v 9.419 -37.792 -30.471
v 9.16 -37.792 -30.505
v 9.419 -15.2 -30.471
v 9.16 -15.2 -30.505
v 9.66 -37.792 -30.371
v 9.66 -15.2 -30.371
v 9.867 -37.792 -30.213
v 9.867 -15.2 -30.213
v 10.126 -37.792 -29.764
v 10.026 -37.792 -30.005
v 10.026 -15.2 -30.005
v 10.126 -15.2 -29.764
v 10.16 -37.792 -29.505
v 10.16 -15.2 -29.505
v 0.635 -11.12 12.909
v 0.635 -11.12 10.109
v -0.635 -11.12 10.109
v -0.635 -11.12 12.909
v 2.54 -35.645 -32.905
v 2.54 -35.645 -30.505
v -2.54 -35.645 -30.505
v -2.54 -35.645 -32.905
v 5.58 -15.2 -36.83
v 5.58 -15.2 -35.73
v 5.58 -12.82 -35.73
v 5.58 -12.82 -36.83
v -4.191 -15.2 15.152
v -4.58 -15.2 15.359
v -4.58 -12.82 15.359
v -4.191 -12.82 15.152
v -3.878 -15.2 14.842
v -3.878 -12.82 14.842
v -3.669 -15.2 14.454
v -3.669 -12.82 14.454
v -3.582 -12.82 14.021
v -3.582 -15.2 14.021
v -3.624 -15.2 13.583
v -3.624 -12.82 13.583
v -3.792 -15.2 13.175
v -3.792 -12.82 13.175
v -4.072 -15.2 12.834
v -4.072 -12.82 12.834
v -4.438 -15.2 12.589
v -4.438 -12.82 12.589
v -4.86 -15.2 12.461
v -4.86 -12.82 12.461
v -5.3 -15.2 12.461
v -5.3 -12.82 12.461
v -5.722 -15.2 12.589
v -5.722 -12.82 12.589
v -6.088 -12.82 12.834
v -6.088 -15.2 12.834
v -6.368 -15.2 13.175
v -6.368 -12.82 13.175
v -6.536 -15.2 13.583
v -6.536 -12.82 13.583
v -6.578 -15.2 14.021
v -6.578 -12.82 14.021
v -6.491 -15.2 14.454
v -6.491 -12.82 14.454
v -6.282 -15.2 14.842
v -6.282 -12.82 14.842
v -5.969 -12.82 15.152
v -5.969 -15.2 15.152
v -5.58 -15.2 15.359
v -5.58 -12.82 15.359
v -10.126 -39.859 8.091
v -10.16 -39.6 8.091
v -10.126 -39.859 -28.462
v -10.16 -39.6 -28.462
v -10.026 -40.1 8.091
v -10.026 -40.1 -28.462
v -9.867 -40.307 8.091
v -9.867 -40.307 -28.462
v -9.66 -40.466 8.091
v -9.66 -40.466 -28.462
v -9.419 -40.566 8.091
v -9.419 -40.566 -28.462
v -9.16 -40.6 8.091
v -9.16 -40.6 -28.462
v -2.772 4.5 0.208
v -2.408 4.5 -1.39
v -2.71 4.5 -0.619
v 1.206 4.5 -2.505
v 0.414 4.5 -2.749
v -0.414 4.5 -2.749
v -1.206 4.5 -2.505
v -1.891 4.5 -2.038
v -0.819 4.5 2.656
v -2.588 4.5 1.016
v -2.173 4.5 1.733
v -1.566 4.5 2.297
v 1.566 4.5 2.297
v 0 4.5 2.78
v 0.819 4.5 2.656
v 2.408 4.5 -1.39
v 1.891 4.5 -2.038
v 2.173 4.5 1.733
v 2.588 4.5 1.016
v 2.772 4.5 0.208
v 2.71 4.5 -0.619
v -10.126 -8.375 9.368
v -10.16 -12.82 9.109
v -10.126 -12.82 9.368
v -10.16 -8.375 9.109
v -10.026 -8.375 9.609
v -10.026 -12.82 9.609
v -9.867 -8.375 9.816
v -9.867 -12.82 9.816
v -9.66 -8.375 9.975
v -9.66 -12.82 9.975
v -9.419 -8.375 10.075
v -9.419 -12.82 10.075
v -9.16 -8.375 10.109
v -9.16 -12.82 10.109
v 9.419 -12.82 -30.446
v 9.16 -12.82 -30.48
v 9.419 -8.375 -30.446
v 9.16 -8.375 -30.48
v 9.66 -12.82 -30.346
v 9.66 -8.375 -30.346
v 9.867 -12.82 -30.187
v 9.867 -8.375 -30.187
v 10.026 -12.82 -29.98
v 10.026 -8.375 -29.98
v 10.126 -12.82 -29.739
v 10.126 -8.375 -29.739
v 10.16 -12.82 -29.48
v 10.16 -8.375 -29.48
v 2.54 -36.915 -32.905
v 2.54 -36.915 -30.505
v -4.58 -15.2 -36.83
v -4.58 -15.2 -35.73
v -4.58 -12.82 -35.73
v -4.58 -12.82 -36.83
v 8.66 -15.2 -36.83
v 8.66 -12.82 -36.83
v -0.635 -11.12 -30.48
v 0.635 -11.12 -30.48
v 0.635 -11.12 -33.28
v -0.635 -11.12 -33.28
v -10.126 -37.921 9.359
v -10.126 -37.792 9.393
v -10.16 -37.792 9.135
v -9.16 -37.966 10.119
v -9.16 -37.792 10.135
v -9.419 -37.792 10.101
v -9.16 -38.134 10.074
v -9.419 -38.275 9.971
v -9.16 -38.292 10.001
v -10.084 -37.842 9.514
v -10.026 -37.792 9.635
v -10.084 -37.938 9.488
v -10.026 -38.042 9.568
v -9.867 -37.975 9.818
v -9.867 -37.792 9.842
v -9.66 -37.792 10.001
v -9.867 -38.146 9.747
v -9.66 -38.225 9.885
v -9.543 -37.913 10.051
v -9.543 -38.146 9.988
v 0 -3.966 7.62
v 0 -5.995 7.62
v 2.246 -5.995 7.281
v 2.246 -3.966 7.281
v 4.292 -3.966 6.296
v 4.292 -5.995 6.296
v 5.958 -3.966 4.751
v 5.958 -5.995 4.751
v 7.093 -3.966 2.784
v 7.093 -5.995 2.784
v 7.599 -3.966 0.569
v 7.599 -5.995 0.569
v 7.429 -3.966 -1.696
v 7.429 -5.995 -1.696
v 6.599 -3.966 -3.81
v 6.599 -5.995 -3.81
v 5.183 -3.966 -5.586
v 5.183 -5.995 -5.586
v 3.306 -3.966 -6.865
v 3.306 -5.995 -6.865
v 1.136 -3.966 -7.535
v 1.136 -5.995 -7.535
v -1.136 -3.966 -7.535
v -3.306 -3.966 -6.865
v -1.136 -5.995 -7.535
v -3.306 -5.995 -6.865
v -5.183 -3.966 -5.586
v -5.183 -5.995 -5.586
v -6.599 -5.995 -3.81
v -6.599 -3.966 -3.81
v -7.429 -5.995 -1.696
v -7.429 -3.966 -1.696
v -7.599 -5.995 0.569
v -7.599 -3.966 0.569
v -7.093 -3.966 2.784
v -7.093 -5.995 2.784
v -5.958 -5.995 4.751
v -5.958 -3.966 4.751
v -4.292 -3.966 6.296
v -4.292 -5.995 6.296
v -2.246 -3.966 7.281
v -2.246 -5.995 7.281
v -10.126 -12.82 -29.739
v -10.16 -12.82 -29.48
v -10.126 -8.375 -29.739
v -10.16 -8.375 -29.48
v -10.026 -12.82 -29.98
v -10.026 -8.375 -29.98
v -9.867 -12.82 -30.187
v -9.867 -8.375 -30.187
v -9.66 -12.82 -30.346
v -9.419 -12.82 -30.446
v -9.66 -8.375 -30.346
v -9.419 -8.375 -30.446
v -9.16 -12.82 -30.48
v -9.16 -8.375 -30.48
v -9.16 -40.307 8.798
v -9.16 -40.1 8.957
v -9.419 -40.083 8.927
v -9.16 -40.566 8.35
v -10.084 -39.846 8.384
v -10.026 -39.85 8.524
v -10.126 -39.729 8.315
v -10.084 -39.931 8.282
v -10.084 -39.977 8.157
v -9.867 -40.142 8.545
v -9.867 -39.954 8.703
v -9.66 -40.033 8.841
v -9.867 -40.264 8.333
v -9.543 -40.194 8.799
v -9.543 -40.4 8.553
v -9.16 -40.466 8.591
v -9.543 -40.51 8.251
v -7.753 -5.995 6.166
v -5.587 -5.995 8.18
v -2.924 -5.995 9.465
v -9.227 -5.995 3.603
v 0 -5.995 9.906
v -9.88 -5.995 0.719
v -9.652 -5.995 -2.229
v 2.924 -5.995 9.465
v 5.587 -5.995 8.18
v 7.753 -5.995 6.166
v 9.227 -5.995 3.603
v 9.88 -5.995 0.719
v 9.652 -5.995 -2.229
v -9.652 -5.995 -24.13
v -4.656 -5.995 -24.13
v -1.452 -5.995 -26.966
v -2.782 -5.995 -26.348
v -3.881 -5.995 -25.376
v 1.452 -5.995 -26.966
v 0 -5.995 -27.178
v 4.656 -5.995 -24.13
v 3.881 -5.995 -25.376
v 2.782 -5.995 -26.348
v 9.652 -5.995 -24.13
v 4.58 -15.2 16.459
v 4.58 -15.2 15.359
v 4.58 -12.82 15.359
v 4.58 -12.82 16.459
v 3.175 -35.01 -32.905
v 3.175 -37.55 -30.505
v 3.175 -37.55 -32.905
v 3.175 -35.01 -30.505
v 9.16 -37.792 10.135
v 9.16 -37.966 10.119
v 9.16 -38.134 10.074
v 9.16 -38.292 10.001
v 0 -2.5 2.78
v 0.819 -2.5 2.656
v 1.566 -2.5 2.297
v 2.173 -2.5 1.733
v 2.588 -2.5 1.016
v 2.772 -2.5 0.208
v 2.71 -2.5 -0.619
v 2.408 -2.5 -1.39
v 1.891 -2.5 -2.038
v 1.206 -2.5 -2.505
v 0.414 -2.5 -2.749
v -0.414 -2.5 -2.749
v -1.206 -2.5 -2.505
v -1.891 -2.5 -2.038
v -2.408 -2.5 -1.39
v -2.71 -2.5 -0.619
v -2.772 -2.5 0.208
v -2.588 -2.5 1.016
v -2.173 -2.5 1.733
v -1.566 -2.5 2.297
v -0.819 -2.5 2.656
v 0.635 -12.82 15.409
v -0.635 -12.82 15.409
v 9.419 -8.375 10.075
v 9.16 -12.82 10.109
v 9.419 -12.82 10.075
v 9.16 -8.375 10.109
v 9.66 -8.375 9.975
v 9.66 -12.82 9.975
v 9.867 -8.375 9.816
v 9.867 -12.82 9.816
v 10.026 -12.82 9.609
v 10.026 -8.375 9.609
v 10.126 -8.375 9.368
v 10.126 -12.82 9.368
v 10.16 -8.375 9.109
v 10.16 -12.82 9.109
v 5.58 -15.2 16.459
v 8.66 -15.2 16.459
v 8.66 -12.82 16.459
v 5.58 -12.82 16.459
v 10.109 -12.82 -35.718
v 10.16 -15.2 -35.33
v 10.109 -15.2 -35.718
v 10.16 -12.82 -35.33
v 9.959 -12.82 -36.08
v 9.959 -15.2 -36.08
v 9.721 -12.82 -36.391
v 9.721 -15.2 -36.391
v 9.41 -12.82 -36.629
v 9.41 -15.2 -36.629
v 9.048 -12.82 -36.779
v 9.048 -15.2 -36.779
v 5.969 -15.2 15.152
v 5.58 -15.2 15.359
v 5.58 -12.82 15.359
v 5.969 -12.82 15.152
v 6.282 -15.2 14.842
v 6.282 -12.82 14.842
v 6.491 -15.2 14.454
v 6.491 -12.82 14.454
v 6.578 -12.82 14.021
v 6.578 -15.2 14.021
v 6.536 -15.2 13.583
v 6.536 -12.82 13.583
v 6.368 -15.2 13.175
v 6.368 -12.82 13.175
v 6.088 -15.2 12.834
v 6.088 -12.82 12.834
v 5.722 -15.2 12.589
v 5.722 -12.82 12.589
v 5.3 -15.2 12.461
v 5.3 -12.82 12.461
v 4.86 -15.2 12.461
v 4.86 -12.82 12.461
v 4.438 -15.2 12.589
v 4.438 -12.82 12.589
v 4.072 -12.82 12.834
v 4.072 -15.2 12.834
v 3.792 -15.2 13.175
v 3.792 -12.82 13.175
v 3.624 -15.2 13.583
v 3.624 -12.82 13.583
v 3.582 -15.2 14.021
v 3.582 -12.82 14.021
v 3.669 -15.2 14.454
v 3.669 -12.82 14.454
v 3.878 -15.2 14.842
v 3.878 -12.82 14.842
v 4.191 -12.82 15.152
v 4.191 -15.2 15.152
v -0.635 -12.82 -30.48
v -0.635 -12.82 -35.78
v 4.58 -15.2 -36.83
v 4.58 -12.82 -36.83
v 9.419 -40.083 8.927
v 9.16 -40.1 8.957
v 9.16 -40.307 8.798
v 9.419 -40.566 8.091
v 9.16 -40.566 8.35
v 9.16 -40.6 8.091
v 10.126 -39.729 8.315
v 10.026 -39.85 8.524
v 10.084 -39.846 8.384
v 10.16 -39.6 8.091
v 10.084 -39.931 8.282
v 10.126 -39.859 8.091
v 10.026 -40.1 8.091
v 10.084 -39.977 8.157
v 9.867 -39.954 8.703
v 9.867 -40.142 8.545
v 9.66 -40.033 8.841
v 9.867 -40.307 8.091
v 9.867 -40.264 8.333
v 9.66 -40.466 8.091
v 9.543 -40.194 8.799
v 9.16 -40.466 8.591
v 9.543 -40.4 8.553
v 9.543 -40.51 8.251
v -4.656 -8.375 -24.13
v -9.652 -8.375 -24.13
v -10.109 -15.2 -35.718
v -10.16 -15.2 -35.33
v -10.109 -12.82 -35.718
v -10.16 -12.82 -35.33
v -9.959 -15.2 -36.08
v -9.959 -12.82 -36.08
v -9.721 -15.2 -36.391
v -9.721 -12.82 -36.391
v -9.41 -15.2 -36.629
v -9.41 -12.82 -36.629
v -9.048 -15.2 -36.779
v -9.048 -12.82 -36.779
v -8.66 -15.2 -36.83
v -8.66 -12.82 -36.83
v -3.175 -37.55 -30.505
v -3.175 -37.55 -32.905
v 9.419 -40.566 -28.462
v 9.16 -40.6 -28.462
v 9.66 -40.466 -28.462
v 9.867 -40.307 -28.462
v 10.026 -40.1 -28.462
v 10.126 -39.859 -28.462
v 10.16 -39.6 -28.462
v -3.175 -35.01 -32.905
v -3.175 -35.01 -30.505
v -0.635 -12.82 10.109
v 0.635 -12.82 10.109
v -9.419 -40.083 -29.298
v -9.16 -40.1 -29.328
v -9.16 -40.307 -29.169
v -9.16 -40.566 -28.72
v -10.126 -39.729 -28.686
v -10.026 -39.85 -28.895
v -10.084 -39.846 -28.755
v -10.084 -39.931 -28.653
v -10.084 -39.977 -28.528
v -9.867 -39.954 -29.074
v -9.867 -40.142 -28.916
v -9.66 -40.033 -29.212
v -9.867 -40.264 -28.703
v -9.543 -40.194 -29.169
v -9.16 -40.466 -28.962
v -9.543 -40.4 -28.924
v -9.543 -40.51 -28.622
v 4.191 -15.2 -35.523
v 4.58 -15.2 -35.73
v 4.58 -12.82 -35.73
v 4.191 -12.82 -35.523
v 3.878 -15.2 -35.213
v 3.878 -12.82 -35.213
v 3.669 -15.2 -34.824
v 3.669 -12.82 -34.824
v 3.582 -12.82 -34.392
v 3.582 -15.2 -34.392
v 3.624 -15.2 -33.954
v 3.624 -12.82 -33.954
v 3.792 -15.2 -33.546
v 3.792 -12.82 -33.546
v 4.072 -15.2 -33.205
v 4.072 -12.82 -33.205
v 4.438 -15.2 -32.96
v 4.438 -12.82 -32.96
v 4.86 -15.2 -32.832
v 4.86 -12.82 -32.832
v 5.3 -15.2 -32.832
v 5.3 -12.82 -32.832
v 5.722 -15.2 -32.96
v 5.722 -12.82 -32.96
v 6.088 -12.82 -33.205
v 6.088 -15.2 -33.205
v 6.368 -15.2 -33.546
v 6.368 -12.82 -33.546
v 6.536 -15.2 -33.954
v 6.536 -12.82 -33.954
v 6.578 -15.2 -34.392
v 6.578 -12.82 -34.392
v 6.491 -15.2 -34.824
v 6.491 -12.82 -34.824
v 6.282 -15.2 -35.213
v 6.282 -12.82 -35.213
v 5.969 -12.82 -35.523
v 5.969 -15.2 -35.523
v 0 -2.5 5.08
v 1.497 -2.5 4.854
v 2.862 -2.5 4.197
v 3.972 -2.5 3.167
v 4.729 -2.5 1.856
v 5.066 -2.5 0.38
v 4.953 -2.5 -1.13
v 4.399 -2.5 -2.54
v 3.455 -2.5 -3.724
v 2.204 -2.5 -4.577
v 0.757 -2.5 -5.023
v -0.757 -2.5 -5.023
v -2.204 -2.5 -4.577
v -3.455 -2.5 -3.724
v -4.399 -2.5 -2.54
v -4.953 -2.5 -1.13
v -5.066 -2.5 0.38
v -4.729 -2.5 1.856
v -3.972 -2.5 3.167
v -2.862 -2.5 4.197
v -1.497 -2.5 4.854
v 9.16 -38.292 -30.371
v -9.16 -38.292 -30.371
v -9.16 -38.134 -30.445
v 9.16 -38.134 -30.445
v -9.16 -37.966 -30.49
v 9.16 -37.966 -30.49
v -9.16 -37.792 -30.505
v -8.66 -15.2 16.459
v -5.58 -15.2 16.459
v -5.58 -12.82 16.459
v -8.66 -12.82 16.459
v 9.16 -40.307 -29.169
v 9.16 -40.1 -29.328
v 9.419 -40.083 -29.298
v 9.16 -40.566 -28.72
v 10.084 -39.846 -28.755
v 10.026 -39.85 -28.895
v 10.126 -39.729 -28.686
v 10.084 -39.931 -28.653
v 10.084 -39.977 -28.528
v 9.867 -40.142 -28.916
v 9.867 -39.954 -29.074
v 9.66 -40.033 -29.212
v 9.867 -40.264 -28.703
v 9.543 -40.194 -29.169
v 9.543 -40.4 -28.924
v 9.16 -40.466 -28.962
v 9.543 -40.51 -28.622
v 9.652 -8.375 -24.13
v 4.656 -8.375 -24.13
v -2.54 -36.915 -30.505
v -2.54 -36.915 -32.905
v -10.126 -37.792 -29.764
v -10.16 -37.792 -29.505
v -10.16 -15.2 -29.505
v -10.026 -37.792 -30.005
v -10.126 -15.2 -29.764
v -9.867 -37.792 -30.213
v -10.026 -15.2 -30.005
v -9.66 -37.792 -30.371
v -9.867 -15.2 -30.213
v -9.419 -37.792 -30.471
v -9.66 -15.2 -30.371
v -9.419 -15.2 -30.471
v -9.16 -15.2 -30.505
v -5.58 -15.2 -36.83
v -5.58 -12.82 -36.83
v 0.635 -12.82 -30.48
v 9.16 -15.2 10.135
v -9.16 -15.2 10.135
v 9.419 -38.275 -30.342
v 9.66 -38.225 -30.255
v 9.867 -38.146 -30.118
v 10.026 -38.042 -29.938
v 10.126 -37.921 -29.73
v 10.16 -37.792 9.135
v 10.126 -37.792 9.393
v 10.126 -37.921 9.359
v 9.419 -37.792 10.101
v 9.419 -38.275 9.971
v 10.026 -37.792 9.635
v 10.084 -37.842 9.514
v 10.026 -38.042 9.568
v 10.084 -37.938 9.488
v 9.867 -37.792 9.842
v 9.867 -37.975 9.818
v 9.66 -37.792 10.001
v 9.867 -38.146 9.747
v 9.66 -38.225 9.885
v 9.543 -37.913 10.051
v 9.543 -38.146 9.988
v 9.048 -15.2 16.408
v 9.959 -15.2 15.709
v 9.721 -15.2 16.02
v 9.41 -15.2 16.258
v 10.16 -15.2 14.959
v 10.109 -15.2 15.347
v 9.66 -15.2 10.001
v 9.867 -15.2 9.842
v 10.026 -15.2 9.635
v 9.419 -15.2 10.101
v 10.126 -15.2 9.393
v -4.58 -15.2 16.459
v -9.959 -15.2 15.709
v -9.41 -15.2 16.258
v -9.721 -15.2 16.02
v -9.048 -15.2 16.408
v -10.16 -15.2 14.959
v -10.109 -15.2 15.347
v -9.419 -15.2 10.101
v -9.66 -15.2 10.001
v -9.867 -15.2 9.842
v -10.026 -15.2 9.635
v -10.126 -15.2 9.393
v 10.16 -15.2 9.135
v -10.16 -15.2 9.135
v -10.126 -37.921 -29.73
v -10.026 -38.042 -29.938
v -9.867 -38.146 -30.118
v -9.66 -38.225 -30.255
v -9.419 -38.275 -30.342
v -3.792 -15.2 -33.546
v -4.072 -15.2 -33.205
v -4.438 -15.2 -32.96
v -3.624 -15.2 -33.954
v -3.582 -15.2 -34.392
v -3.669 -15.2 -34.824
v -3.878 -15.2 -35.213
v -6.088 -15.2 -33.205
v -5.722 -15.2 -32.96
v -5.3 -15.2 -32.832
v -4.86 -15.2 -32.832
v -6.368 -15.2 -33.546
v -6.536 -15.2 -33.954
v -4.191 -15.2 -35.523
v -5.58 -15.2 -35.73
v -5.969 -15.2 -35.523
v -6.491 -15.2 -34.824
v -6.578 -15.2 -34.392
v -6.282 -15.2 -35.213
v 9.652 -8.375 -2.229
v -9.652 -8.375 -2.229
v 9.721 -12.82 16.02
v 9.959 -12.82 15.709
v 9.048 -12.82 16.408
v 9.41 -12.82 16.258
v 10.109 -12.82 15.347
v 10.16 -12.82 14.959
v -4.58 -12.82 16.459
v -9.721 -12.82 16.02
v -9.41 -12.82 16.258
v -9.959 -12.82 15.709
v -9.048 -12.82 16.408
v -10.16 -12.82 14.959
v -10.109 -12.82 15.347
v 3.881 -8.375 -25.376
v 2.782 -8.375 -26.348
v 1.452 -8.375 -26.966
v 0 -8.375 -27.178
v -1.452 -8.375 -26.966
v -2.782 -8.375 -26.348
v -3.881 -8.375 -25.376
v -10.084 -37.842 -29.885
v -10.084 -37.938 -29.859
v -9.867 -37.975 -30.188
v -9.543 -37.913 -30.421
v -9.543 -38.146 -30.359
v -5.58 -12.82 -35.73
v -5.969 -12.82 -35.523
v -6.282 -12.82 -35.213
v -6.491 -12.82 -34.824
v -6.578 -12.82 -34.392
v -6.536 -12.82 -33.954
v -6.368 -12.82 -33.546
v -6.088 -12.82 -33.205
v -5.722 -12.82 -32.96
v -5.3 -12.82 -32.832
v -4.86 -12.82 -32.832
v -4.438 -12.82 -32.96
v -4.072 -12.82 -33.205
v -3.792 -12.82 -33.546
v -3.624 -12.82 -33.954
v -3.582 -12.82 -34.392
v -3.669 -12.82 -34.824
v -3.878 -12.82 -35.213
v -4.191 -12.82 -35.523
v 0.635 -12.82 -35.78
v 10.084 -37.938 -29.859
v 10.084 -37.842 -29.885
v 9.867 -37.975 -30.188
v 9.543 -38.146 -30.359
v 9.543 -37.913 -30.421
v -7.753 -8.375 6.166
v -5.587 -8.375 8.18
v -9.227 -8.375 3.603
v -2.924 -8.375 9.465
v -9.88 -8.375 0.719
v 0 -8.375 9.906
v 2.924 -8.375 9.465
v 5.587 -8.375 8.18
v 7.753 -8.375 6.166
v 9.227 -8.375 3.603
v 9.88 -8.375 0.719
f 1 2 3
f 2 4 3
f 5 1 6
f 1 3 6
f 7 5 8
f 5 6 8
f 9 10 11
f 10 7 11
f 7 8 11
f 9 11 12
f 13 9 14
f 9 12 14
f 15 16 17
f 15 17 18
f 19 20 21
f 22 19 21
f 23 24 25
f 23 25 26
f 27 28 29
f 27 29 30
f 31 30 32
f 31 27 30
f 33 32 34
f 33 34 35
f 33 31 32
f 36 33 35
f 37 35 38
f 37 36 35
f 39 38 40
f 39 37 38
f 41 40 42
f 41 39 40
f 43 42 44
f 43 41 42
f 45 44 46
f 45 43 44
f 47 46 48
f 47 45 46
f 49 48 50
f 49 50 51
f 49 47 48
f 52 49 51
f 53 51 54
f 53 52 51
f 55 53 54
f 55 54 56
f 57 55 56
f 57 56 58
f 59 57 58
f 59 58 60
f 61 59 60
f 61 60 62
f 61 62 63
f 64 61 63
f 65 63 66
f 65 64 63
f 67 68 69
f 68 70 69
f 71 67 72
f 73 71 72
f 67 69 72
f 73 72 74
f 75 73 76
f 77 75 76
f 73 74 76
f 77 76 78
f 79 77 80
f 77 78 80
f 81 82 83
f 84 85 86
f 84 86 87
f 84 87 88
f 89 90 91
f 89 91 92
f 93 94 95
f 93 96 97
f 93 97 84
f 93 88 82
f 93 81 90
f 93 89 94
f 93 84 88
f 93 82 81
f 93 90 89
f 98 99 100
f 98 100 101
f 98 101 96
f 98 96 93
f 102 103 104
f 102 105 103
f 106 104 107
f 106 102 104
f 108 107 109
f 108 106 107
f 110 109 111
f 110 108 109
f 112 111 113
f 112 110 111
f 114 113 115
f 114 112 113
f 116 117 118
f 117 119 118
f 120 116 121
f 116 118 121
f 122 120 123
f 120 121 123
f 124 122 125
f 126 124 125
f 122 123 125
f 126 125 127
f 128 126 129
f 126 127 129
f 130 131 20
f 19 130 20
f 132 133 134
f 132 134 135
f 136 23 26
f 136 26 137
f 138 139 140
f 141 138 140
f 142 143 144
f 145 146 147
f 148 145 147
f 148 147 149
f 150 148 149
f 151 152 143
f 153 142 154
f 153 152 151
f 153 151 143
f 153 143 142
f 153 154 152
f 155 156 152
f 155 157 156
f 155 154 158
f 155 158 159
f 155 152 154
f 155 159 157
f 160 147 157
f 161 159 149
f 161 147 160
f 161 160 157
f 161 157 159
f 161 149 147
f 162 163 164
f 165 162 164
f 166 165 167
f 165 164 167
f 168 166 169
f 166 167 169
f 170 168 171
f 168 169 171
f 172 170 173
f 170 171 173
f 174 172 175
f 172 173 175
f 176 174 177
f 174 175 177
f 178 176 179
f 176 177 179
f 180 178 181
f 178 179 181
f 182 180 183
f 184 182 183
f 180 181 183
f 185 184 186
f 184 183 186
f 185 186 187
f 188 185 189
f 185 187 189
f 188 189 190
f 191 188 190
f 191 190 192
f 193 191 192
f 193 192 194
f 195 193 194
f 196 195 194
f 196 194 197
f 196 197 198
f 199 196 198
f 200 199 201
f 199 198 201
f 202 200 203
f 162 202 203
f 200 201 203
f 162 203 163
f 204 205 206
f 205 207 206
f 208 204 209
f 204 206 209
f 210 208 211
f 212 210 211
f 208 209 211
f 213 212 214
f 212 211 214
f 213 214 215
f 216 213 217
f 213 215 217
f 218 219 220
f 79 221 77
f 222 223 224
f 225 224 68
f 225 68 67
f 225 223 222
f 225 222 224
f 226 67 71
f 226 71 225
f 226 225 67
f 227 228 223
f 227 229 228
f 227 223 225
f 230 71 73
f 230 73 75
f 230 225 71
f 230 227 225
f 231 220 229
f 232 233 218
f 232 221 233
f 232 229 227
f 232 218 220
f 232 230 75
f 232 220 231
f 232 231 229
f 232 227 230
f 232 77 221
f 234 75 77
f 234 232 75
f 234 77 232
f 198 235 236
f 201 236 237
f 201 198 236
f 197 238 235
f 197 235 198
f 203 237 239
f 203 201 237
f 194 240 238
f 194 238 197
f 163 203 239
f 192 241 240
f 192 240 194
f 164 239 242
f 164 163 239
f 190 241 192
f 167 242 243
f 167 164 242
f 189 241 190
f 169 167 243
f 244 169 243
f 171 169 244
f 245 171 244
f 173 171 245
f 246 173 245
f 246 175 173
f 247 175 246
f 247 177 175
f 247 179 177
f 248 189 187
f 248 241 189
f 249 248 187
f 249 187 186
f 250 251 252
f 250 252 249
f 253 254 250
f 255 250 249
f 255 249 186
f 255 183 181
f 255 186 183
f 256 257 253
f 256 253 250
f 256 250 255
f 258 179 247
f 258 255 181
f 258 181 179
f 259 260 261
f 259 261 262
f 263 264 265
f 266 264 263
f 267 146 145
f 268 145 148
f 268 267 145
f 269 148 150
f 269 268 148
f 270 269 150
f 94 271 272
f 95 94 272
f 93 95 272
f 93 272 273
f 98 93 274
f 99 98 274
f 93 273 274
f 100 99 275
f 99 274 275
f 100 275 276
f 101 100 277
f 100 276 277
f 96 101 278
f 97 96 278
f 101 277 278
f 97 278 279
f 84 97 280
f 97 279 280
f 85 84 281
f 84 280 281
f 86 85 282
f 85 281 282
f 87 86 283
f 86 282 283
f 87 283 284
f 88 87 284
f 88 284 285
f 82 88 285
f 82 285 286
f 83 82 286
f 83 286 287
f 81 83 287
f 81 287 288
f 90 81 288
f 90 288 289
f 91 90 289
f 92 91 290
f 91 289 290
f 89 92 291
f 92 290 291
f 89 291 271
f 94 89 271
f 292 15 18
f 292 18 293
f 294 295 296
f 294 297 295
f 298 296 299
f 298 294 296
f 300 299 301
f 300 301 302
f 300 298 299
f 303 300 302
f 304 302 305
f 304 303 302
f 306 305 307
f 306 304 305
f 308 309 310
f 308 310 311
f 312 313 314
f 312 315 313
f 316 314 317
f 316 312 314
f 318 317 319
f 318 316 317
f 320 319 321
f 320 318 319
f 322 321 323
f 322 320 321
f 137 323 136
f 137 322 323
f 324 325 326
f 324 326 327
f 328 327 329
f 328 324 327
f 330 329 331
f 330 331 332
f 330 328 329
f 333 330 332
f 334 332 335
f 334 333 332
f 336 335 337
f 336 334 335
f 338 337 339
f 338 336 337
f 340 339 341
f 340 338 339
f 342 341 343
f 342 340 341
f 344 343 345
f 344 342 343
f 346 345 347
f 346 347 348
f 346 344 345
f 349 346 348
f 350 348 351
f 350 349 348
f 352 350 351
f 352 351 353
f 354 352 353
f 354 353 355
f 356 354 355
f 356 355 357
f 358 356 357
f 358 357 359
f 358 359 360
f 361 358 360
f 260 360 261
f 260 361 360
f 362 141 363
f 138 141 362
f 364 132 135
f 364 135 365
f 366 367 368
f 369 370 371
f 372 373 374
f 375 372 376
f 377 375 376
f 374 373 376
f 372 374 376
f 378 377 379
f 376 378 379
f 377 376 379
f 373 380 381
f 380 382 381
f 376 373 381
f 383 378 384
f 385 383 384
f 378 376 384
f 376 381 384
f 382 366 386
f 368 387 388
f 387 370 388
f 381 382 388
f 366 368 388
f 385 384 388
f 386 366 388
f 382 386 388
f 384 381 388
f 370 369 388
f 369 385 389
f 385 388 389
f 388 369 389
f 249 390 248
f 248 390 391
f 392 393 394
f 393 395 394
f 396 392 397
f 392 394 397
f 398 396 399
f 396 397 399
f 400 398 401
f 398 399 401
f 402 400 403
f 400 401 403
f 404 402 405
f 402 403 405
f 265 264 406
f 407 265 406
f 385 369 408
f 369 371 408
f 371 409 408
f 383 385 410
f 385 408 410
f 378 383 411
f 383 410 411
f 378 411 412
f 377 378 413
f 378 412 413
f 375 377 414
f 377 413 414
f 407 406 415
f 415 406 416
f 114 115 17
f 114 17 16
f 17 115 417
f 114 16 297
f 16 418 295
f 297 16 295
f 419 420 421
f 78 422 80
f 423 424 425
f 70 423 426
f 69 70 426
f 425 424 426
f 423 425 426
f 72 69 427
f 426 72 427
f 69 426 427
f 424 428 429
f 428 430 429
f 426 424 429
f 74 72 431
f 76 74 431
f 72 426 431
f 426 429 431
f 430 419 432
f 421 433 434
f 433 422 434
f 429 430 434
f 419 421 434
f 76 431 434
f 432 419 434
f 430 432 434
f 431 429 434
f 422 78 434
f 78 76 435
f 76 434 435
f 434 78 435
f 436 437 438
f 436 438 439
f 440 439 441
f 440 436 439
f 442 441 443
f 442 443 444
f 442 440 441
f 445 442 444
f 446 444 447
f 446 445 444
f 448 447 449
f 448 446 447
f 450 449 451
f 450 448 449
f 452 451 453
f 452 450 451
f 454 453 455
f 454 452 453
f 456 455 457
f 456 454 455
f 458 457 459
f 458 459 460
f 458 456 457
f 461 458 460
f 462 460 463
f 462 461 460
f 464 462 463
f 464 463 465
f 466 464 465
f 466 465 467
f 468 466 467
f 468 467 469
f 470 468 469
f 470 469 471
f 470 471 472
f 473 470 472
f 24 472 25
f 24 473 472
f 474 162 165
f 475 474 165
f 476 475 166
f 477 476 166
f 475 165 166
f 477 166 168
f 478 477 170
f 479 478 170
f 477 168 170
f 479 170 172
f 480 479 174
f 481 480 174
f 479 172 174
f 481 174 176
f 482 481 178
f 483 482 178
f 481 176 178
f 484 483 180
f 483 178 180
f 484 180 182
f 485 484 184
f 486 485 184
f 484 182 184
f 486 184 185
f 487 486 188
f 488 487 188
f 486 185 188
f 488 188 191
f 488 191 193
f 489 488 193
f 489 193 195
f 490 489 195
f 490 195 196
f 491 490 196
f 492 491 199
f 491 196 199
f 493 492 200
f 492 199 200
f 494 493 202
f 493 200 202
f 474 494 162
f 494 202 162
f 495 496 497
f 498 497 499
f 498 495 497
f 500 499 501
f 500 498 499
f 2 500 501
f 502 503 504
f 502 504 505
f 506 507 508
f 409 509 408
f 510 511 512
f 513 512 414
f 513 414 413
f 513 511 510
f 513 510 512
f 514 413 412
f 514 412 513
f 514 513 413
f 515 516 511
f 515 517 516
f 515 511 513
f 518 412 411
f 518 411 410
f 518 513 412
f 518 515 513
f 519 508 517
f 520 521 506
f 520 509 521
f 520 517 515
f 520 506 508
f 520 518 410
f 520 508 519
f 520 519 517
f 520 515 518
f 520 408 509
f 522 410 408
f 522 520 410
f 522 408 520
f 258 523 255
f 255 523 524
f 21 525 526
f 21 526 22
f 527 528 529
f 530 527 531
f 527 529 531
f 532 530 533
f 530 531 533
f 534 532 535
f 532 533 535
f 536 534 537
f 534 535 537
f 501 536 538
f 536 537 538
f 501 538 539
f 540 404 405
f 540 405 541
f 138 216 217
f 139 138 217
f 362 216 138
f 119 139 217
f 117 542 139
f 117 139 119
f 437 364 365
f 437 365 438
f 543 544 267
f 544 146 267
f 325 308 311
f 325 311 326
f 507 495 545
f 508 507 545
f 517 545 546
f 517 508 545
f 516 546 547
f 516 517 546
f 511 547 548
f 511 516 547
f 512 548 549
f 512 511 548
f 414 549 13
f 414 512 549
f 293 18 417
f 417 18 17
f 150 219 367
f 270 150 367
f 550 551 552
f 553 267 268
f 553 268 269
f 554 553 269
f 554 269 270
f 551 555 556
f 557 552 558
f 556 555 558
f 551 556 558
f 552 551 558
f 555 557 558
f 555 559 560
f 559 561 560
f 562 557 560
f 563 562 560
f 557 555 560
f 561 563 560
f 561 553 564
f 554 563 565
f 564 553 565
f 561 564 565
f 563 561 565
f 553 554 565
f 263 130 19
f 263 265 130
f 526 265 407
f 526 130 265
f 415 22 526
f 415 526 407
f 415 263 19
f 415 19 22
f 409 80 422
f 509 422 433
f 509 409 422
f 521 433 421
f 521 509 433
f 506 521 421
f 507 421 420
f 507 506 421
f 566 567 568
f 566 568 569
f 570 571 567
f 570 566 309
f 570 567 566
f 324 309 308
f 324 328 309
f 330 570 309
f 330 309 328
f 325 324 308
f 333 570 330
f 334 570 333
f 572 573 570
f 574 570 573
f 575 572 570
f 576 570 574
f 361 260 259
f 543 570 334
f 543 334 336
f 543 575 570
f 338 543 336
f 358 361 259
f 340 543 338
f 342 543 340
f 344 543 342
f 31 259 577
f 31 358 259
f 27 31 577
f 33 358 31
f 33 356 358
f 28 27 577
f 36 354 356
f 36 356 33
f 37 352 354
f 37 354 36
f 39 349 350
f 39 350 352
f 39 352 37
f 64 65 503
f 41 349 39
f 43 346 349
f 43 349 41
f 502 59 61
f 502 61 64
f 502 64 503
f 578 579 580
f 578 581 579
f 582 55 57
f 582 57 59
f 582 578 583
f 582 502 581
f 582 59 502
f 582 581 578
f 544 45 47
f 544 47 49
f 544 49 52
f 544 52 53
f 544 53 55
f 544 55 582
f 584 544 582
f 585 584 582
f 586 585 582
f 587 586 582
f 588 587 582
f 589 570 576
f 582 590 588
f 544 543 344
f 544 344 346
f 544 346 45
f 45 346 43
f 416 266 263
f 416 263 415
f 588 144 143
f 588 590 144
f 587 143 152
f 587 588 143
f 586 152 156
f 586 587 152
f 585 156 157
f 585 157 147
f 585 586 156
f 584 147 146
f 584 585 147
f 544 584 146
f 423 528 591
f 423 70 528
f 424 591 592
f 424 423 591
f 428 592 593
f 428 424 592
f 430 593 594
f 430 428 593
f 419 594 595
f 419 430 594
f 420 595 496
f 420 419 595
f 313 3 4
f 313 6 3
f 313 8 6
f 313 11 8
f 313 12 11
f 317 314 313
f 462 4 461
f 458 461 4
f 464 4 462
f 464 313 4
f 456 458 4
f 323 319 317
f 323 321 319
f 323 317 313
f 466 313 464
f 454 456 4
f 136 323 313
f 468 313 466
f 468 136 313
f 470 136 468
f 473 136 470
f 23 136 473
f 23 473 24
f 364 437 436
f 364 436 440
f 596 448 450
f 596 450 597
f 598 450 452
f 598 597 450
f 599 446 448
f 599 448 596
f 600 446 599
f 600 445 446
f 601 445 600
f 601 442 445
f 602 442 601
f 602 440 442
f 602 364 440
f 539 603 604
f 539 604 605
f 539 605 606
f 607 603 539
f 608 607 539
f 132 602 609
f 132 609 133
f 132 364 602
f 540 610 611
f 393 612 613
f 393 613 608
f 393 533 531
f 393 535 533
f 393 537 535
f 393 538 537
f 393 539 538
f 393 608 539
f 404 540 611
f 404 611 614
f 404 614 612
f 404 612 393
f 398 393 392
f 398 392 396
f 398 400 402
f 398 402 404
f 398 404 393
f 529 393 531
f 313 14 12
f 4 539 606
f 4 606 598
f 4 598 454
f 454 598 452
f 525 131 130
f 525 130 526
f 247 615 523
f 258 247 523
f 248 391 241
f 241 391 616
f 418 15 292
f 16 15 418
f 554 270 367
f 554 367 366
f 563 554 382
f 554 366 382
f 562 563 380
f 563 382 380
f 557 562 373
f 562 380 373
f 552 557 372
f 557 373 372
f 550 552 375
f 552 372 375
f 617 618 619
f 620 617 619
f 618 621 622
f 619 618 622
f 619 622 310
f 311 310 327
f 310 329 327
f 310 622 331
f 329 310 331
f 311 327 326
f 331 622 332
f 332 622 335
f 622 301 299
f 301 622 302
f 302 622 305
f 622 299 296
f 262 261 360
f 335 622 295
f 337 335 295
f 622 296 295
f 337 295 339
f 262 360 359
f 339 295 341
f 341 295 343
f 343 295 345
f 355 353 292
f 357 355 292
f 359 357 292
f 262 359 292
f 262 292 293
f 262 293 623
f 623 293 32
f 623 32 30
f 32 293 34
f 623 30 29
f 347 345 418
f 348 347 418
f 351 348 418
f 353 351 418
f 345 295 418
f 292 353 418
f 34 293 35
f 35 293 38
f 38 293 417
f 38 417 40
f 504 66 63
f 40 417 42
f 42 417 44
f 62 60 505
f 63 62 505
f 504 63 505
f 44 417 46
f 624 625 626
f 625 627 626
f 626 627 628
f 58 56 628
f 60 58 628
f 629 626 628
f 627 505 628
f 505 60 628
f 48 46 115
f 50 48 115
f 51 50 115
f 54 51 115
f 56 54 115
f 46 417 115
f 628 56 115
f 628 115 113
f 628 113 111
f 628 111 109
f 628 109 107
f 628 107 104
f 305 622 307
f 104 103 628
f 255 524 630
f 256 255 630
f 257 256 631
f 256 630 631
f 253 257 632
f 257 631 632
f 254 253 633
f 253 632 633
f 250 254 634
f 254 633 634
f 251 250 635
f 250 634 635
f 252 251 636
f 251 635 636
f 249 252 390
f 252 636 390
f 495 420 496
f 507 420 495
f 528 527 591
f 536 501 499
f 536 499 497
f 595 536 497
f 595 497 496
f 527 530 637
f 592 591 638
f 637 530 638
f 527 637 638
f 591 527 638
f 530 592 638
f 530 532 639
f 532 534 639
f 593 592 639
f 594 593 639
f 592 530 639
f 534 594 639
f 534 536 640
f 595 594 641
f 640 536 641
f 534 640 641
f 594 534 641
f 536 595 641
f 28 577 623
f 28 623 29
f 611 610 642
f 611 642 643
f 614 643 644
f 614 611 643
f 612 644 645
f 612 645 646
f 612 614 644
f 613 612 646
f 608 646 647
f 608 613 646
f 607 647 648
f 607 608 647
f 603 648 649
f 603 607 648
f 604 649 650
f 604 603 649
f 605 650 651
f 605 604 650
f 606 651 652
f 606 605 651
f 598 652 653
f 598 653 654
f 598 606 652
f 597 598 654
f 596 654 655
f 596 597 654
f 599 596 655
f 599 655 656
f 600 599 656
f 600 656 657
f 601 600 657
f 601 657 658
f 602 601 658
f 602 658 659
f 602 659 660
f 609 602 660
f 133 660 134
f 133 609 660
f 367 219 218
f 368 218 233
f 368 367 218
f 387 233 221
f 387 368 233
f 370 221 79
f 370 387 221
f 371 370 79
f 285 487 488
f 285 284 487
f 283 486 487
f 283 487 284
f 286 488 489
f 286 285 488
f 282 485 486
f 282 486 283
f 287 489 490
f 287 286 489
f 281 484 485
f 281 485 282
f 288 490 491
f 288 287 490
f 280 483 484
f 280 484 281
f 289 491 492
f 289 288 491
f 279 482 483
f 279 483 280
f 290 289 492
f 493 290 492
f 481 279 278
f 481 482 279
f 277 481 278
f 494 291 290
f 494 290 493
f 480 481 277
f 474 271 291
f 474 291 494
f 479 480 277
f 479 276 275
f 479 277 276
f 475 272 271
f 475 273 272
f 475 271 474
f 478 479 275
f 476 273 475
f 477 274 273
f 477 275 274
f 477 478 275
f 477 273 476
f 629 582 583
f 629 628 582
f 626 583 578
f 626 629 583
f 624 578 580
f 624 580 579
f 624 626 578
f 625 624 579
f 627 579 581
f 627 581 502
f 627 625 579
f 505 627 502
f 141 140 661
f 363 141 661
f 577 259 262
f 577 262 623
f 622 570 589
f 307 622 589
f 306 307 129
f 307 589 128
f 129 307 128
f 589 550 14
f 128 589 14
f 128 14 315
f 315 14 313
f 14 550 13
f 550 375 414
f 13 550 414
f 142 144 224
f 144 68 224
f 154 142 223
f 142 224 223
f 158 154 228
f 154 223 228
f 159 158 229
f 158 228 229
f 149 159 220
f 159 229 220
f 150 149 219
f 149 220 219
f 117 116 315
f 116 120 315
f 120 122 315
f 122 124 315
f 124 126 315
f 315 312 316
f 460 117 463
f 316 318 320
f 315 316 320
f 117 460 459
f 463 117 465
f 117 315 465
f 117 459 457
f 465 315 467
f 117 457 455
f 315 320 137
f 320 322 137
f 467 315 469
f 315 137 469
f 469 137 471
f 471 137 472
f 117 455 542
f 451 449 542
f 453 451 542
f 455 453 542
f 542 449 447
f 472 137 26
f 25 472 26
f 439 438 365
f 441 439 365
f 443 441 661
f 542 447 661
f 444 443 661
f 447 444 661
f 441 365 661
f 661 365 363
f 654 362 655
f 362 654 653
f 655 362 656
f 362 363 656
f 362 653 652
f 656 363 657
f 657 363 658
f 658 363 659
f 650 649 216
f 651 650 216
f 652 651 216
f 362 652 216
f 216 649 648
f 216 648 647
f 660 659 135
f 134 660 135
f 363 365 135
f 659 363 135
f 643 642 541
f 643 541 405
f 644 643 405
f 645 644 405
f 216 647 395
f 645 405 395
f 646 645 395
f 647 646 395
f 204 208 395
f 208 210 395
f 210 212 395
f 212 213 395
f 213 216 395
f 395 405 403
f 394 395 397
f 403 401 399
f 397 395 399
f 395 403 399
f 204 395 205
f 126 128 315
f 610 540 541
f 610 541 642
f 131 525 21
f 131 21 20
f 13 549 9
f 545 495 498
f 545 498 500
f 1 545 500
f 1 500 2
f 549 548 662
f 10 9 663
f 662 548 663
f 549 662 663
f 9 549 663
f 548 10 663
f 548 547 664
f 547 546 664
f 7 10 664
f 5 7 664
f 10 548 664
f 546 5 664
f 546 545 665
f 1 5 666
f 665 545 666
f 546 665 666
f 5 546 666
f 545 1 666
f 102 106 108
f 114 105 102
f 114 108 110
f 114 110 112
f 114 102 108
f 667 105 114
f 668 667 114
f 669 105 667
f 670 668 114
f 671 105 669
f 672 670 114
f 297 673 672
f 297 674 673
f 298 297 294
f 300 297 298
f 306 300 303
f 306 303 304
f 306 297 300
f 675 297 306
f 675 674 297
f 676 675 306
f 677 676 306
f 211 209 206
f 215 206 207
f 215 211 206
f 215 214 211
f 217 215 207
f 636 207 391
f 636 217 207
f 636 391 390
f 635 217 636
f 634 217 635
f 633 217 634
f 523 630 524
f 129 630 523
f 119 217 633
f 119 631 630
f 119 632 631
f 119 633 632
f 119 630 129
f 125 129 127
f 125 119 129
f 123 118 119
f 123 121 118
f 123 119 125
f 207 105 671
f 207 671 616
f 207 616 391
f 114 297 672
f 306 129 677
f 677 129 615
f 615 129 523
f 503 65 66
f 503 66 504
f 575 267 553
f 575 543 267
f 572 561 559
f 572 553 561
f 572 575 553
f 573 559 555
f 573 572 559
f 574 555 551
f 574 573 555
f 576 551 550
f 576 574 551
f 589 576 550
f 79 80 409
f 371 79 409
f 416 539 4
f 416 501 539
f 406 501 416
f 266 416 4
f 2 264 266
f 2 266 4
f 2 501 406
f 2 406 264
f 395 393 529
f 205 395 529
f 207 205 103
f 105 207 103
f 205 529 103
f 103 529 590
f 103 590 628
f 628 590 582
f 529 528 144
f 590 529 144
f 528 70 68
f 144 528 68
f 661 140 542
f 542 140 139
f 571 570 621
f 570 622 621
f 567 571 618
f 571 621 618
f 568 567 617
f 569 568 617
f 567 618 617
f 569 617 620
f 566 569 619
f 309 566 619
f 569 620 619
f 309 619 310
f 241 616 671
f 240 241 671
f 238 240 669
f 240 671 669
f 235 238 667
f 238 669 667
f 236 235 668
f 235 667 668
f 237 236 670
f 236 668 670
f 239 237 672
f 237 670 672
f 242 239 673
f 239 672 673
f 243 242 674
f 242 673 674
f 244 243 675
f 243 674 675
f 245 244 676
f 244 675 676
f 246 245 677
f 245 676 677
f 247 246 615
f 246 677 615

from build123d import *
from OCP.BRepFilletAPI import BRepFilletAPI_MakeChamfer

# Parameters (mm, degrees)
SKETCH1_W           = 20.32
SKETCH1_H           = 40.64
BOSS_EXTRUDE1_DEPTH = 25.4
SKETCH2_W           = 20.32
SKETCH2_H           = 40.64
BOSS_EXTRUDE2_DEPTH = 2.38
SKETCH3_W           = 20.32
SKETCH3_H           = 40.5892
BOSS_EXTRUDE3_DEPTH = 4.445
BOSS_EXTRUDE4_DEPTH = 2.38
SKETCH6_R           = 7.62
BOSS_EXTRUDE5_DEPTH = 3.495
CHAMFER1_SIZE       = 2.54
CHAMFER1_SIZE2      = 1.466469684
BOSS_EXTRUDE6_DEPTH = 0.635
SKETCH9_R           = 2.78
BOSS_EXTRUDE7_DEPTH = 7
CHAMFER2_SIZE       = 2.54
CHAMFER2_SIZE2      = 1.466469684
FILLET1_R           = 1
FILLET2_R           = 1.5
SKETCH10_W          = 6.35
SKETCH10_H          = 2.54
SKETCH10_W_2        = 5.08
SKETCH10_H_2        = 1.27
BOSS_EXTRUDE8_DEPTH = 2.4


with BuildPart() as part:
    # Sketch1 → Boss-Extrude1 (new body)
    with BuildSketch(Plane(origin=(0, 0, 0), x_dir=(1, 0, 0), z_dir=(0, 1, 0))):
        with Locations((0, -10.16)):
            Rectangle(SKETCH1_W, SKETCH1_H)
    extrude(amount=BOSS_EXTRUDE1_DEPTH)

    # Sketch2 → Boss-Extrude2 (add)
    with BuildSketch(Plane(origin=(0, 25.4, 0), x_dir=(1, 0, 0), z_dir=(0, 1, 0))):
        with BuildLine():
            ThreePointArc((-5.58, 15.384213562), (-5.08, 12.47), (-4.58, 15.384213562))
            Line((-4.58, 15.384213562), (-4.58, 16.4846))
            Line((-4.58, 16.4846), (4.58, 16.4846))
            Line((4.58, 16.4846), (4.58, 15.384213562))
            ThreePointArc((4.58, 15.384213562), (5.08, 12.47), (5.58, 15.384213562))
            Line((5.58, 15.384213562), (5.58, 16.4846))
            Line((5.58, 16.4846), (10.16, 16.4846))
            Line((10.16, 16.4846), (10.16, 10.16))
            Line((10.16, 10.16), (-10.16, 10.16))
            Line((-10.16, 10.16), (-10.16, 16.4846))
            Line((-10.16, 16.4846), (-5.58, 16.4846))
            Line((-5.58, 16.4846), (-5.58, 15.384213562))
        make_face()
        with Locations((0, -10.16)):
            Rectangle(SKETCH2_W, SKETCH2_H)
        with BuildLine():
            ThreePointArc((5.58, -35.704213562), (5.08, -32.79), (4.58, -35.704213562))
            Line((4.58, -35.704213562), (4.58, -36.8046))
            Line((4.58, -36.8046), (-4.58, -36.8046))
            Line((-4.58, -36.8046), (-4.58, -35.704213562))
            ThreePointArc((-4.58, -35.704213562), (-5.08, -32.79), (-5.58, -35.704213562))
            Line((-5.58, -35.704213562), (-5.58, -36.8046))
            Line((-5.58, -36.8046), (-10.16, -36.8046))
            Line((-10.16, -36.8046), (-10.16, -30.48))
            Line((-10.16, -30.48), (10.16, -30.48))
            Line((10.16, -30.48), (10.16, -36.8046))
            Line((10.16, -36.8046), (5.58, -36.8046))
            Line((5.58, -36.8046), (5.58, -35.704213562))
        make_face()
    extrude(amount=BOSS_EXTRUDE2_DEPTH)

    # Sketch3 → Boss-Extrude3 (add)
    with BuildSketch(Plane(origin=(0, 27.78, 0), x_dir=(1, 0, 0), z_dir=(0, 1, 0))):
        with Locations((0, -10.16)):
            Rectangle(SKETCH3_W, SKETCH3_H)
    extrude(amount=BOSS_EXTRUDE3_DEPTH)

    # Sketch4 → Boss-Extrude4 (add)
    with BuildSketch(Plane(origin=(0, 32.225, 0), x_dir=(1, 0, 0), z_dir=(0, 1, 0))):
        with BuildLine():
            Line((9.652, -18.116559046), (9.652, 3.7846))
            Line((9.652, 3.7846), (4.655896906, 3.7846))
            ThreePointArc((4.655896906, 3.7846), (0, 6.8326), (-4.655896906, 3.7846))
            Line((-4.655896906, 3.7846), (-9.652, 3.7846))
            Line((-9.652, 3.7846), (-9.652, -18.116559046))
            ThreePointArc((-9.652, -18.116559046), (0, -30.2514), (9.652, -18.116559046))
        make_face()
    extrude(amount=BOSS_EXTRUDE4_DEPTH)

    # Sketch6 → Boss-Extrude5 (add)
    with BuildSketch(Plane(origin=(0, 34.605, 0), x_dir=(1, 0, 0), z_dir=(0, 1, 0))):
        with Locations(Location((0, -20.3454, 0), (0, 0, 270))):
            Circle(SKETCH6_R)
    extrude(amount=BOSS_EXTRUDE5_DEPTH)

    # Chamfer1
    chamfer1_edges = [part.edges().sort_by_distance(p)[0] for p in [
        (0, 38.1, 12.7254),
    ]]
    chamfer1_side = [part.faces().sort_by_distance(p)[0] for p in [
        (0, 38.1, 20.3454),
    ]]
    chamfer(chamfer1_edges, length=CHAMFER1_SIZE, length2=CHAMFER1_SIZE2, reference=chamfer1_side[0])

    # Sketch8 → Boss-Extrude6 (add, symmetric)
    with BuildSketch(Plane(origin=(0, 0, 0), x_dir=(0, 0, -1), z_dir=(1, 0, 0))):
        Polygon((-30.4546, 27.78), (-30.4546, 29.48), (-33.2546, 29.48), (-35.7546, 27.78), align=None)
    boss_extrude6 = extrude(amount=BOSS_EXTRUDE6_DEPTH, both=True)

    # Mirror1: Boss-Extrude6 across plane
    add(boss_extrude6.mirror(Plane.XY.offset(10.16)))

    # Sketch9 → Boss-Extrude7 (add)
    with BuildSketch(Plane(origin=(0, 38.1, 0), x_dir=(1, 0, 0), z_dir=(0, 1, 0))):
        with Locations(Location((0, -20.3454, 0), (0, 0, 270))):
            Circle(SKETCH9_R)
    extrude(amount=BOSS_EXTRUDE7_DEPTH)

    # Chamfer2: one chamfer whose edges measure the first distance from different faces: ONE call of the kernel's chamfer builder (chamfer() names one face for all edges)
    chamfer2_edges_1 = [part.edges().sort_by_distance(p)[0] for p in [
        (0, 0, -10.16),
    ]]
    chamfer2_side_1 = [part.faces().sort_by_distance(p)[0] for p in [
        (0, 12.7, -10.16),
    ]]
    chamfer2_edges_2 = [part.edges().sort_by_distance(p)[0] for p in [
        (0, 0, 30.48),
    ]]
    chamfer2_side_2 = [part.faces().sort_by_distance(p)[0] for p in [
        (0, 12.7, 30.48),
    ]]
    chamfer2 = BRepFilletAPI_MakeChamfer(part.part.solid().wrapped)
    for e in chamfer2_edges_1:
        chamfer2.Add(CHAMFER2_SIZE, CHAMFER2_SIZE2, e.wrapped, chamfer2_side_1[0].wrapped)  # the first distance lies on this face
    for e in chamfer2_edges_2:
        chamfer2.Add(CHAMFER2_SIZE, CHAMFER2_SIZE2, e.wrapped, chamfer2_side_2[0].wrapped)  # the first distance lies on this face
    add(Compound.cast(chamfer2.Shape()), mode=Mode.REPLACE)

    # Fillet1
    fillet1_edges = [part.edges().sort_by_distance(p)[0] for p in [
        (-10.16, 30.0025, -10.1346),
        (-10.16, 13.97, -10.16),
        (-10.16, 1.27, -9.426765158),
        (-10.16, 0, 10.16),
        (0, 0, -8.693530316),
        (0, 2.54, -10.16),
        (10.16, 1.27, -9.426765158),
        (10.16, 0, 10.16),
        (0, 0, 29.013530316),
        (10.16, 1.27, 29.746765158),
        (0, 2.54, 30.48),
        (10.16, 13.97, -10.16),
        (10.16, 30.0025, -10.1346),
        (-10.16, 30.0025, 30.4546),
        (10.16, 30.0025, 30.4546),
        (-10.16, 13.97, 30.48),
        (10.16, 13.97, 30.48),
        (-10.16, 1.27, 29.746765158),
    ]]
    fillet(fillet1_edges, radius=FILLET1_R)

    # Fillet2
    fillet2_edges = [part.edges().sort_by_distance(p)[0] for p in [
        (-10.16, 26.59, -16.4846),
        (10.16, 26.59, -16.4846),
        (10.16, 26.59, 36.8046),
        (-10.16, 26.59, 36.8046),
    ]]
    fillet(fillet2_edges, radius=FILLET2_R)

    # Sketch10 → Boss-Extrude8 (add)
    with BuildSketch(Plane(origin=(0, 0, -10.16), x_dir=(-1, 0, 0), z_dir=(0, 0, -1))):
        with Locations((0, 4.32)):
            Rectangle(SKETCH10_W, SKETCH10_H)
        with Locations((0, 4.32)):
            Rectangle(SKETCH10_W_2, SKETCH10_H_2, mode=Mode.SUBTRACT)
    extrude(amount=BOSS_EXTRUDE8_DEPTH)


with BuildPart() as part_1:
    # Body-Move/Copy1: read off the stored shape, not the designer's step
    # Body-Move/Copy1: moved
    add(part.part.moved(Location((0, -40.6, -20.3454))))


solid = part_1.part
